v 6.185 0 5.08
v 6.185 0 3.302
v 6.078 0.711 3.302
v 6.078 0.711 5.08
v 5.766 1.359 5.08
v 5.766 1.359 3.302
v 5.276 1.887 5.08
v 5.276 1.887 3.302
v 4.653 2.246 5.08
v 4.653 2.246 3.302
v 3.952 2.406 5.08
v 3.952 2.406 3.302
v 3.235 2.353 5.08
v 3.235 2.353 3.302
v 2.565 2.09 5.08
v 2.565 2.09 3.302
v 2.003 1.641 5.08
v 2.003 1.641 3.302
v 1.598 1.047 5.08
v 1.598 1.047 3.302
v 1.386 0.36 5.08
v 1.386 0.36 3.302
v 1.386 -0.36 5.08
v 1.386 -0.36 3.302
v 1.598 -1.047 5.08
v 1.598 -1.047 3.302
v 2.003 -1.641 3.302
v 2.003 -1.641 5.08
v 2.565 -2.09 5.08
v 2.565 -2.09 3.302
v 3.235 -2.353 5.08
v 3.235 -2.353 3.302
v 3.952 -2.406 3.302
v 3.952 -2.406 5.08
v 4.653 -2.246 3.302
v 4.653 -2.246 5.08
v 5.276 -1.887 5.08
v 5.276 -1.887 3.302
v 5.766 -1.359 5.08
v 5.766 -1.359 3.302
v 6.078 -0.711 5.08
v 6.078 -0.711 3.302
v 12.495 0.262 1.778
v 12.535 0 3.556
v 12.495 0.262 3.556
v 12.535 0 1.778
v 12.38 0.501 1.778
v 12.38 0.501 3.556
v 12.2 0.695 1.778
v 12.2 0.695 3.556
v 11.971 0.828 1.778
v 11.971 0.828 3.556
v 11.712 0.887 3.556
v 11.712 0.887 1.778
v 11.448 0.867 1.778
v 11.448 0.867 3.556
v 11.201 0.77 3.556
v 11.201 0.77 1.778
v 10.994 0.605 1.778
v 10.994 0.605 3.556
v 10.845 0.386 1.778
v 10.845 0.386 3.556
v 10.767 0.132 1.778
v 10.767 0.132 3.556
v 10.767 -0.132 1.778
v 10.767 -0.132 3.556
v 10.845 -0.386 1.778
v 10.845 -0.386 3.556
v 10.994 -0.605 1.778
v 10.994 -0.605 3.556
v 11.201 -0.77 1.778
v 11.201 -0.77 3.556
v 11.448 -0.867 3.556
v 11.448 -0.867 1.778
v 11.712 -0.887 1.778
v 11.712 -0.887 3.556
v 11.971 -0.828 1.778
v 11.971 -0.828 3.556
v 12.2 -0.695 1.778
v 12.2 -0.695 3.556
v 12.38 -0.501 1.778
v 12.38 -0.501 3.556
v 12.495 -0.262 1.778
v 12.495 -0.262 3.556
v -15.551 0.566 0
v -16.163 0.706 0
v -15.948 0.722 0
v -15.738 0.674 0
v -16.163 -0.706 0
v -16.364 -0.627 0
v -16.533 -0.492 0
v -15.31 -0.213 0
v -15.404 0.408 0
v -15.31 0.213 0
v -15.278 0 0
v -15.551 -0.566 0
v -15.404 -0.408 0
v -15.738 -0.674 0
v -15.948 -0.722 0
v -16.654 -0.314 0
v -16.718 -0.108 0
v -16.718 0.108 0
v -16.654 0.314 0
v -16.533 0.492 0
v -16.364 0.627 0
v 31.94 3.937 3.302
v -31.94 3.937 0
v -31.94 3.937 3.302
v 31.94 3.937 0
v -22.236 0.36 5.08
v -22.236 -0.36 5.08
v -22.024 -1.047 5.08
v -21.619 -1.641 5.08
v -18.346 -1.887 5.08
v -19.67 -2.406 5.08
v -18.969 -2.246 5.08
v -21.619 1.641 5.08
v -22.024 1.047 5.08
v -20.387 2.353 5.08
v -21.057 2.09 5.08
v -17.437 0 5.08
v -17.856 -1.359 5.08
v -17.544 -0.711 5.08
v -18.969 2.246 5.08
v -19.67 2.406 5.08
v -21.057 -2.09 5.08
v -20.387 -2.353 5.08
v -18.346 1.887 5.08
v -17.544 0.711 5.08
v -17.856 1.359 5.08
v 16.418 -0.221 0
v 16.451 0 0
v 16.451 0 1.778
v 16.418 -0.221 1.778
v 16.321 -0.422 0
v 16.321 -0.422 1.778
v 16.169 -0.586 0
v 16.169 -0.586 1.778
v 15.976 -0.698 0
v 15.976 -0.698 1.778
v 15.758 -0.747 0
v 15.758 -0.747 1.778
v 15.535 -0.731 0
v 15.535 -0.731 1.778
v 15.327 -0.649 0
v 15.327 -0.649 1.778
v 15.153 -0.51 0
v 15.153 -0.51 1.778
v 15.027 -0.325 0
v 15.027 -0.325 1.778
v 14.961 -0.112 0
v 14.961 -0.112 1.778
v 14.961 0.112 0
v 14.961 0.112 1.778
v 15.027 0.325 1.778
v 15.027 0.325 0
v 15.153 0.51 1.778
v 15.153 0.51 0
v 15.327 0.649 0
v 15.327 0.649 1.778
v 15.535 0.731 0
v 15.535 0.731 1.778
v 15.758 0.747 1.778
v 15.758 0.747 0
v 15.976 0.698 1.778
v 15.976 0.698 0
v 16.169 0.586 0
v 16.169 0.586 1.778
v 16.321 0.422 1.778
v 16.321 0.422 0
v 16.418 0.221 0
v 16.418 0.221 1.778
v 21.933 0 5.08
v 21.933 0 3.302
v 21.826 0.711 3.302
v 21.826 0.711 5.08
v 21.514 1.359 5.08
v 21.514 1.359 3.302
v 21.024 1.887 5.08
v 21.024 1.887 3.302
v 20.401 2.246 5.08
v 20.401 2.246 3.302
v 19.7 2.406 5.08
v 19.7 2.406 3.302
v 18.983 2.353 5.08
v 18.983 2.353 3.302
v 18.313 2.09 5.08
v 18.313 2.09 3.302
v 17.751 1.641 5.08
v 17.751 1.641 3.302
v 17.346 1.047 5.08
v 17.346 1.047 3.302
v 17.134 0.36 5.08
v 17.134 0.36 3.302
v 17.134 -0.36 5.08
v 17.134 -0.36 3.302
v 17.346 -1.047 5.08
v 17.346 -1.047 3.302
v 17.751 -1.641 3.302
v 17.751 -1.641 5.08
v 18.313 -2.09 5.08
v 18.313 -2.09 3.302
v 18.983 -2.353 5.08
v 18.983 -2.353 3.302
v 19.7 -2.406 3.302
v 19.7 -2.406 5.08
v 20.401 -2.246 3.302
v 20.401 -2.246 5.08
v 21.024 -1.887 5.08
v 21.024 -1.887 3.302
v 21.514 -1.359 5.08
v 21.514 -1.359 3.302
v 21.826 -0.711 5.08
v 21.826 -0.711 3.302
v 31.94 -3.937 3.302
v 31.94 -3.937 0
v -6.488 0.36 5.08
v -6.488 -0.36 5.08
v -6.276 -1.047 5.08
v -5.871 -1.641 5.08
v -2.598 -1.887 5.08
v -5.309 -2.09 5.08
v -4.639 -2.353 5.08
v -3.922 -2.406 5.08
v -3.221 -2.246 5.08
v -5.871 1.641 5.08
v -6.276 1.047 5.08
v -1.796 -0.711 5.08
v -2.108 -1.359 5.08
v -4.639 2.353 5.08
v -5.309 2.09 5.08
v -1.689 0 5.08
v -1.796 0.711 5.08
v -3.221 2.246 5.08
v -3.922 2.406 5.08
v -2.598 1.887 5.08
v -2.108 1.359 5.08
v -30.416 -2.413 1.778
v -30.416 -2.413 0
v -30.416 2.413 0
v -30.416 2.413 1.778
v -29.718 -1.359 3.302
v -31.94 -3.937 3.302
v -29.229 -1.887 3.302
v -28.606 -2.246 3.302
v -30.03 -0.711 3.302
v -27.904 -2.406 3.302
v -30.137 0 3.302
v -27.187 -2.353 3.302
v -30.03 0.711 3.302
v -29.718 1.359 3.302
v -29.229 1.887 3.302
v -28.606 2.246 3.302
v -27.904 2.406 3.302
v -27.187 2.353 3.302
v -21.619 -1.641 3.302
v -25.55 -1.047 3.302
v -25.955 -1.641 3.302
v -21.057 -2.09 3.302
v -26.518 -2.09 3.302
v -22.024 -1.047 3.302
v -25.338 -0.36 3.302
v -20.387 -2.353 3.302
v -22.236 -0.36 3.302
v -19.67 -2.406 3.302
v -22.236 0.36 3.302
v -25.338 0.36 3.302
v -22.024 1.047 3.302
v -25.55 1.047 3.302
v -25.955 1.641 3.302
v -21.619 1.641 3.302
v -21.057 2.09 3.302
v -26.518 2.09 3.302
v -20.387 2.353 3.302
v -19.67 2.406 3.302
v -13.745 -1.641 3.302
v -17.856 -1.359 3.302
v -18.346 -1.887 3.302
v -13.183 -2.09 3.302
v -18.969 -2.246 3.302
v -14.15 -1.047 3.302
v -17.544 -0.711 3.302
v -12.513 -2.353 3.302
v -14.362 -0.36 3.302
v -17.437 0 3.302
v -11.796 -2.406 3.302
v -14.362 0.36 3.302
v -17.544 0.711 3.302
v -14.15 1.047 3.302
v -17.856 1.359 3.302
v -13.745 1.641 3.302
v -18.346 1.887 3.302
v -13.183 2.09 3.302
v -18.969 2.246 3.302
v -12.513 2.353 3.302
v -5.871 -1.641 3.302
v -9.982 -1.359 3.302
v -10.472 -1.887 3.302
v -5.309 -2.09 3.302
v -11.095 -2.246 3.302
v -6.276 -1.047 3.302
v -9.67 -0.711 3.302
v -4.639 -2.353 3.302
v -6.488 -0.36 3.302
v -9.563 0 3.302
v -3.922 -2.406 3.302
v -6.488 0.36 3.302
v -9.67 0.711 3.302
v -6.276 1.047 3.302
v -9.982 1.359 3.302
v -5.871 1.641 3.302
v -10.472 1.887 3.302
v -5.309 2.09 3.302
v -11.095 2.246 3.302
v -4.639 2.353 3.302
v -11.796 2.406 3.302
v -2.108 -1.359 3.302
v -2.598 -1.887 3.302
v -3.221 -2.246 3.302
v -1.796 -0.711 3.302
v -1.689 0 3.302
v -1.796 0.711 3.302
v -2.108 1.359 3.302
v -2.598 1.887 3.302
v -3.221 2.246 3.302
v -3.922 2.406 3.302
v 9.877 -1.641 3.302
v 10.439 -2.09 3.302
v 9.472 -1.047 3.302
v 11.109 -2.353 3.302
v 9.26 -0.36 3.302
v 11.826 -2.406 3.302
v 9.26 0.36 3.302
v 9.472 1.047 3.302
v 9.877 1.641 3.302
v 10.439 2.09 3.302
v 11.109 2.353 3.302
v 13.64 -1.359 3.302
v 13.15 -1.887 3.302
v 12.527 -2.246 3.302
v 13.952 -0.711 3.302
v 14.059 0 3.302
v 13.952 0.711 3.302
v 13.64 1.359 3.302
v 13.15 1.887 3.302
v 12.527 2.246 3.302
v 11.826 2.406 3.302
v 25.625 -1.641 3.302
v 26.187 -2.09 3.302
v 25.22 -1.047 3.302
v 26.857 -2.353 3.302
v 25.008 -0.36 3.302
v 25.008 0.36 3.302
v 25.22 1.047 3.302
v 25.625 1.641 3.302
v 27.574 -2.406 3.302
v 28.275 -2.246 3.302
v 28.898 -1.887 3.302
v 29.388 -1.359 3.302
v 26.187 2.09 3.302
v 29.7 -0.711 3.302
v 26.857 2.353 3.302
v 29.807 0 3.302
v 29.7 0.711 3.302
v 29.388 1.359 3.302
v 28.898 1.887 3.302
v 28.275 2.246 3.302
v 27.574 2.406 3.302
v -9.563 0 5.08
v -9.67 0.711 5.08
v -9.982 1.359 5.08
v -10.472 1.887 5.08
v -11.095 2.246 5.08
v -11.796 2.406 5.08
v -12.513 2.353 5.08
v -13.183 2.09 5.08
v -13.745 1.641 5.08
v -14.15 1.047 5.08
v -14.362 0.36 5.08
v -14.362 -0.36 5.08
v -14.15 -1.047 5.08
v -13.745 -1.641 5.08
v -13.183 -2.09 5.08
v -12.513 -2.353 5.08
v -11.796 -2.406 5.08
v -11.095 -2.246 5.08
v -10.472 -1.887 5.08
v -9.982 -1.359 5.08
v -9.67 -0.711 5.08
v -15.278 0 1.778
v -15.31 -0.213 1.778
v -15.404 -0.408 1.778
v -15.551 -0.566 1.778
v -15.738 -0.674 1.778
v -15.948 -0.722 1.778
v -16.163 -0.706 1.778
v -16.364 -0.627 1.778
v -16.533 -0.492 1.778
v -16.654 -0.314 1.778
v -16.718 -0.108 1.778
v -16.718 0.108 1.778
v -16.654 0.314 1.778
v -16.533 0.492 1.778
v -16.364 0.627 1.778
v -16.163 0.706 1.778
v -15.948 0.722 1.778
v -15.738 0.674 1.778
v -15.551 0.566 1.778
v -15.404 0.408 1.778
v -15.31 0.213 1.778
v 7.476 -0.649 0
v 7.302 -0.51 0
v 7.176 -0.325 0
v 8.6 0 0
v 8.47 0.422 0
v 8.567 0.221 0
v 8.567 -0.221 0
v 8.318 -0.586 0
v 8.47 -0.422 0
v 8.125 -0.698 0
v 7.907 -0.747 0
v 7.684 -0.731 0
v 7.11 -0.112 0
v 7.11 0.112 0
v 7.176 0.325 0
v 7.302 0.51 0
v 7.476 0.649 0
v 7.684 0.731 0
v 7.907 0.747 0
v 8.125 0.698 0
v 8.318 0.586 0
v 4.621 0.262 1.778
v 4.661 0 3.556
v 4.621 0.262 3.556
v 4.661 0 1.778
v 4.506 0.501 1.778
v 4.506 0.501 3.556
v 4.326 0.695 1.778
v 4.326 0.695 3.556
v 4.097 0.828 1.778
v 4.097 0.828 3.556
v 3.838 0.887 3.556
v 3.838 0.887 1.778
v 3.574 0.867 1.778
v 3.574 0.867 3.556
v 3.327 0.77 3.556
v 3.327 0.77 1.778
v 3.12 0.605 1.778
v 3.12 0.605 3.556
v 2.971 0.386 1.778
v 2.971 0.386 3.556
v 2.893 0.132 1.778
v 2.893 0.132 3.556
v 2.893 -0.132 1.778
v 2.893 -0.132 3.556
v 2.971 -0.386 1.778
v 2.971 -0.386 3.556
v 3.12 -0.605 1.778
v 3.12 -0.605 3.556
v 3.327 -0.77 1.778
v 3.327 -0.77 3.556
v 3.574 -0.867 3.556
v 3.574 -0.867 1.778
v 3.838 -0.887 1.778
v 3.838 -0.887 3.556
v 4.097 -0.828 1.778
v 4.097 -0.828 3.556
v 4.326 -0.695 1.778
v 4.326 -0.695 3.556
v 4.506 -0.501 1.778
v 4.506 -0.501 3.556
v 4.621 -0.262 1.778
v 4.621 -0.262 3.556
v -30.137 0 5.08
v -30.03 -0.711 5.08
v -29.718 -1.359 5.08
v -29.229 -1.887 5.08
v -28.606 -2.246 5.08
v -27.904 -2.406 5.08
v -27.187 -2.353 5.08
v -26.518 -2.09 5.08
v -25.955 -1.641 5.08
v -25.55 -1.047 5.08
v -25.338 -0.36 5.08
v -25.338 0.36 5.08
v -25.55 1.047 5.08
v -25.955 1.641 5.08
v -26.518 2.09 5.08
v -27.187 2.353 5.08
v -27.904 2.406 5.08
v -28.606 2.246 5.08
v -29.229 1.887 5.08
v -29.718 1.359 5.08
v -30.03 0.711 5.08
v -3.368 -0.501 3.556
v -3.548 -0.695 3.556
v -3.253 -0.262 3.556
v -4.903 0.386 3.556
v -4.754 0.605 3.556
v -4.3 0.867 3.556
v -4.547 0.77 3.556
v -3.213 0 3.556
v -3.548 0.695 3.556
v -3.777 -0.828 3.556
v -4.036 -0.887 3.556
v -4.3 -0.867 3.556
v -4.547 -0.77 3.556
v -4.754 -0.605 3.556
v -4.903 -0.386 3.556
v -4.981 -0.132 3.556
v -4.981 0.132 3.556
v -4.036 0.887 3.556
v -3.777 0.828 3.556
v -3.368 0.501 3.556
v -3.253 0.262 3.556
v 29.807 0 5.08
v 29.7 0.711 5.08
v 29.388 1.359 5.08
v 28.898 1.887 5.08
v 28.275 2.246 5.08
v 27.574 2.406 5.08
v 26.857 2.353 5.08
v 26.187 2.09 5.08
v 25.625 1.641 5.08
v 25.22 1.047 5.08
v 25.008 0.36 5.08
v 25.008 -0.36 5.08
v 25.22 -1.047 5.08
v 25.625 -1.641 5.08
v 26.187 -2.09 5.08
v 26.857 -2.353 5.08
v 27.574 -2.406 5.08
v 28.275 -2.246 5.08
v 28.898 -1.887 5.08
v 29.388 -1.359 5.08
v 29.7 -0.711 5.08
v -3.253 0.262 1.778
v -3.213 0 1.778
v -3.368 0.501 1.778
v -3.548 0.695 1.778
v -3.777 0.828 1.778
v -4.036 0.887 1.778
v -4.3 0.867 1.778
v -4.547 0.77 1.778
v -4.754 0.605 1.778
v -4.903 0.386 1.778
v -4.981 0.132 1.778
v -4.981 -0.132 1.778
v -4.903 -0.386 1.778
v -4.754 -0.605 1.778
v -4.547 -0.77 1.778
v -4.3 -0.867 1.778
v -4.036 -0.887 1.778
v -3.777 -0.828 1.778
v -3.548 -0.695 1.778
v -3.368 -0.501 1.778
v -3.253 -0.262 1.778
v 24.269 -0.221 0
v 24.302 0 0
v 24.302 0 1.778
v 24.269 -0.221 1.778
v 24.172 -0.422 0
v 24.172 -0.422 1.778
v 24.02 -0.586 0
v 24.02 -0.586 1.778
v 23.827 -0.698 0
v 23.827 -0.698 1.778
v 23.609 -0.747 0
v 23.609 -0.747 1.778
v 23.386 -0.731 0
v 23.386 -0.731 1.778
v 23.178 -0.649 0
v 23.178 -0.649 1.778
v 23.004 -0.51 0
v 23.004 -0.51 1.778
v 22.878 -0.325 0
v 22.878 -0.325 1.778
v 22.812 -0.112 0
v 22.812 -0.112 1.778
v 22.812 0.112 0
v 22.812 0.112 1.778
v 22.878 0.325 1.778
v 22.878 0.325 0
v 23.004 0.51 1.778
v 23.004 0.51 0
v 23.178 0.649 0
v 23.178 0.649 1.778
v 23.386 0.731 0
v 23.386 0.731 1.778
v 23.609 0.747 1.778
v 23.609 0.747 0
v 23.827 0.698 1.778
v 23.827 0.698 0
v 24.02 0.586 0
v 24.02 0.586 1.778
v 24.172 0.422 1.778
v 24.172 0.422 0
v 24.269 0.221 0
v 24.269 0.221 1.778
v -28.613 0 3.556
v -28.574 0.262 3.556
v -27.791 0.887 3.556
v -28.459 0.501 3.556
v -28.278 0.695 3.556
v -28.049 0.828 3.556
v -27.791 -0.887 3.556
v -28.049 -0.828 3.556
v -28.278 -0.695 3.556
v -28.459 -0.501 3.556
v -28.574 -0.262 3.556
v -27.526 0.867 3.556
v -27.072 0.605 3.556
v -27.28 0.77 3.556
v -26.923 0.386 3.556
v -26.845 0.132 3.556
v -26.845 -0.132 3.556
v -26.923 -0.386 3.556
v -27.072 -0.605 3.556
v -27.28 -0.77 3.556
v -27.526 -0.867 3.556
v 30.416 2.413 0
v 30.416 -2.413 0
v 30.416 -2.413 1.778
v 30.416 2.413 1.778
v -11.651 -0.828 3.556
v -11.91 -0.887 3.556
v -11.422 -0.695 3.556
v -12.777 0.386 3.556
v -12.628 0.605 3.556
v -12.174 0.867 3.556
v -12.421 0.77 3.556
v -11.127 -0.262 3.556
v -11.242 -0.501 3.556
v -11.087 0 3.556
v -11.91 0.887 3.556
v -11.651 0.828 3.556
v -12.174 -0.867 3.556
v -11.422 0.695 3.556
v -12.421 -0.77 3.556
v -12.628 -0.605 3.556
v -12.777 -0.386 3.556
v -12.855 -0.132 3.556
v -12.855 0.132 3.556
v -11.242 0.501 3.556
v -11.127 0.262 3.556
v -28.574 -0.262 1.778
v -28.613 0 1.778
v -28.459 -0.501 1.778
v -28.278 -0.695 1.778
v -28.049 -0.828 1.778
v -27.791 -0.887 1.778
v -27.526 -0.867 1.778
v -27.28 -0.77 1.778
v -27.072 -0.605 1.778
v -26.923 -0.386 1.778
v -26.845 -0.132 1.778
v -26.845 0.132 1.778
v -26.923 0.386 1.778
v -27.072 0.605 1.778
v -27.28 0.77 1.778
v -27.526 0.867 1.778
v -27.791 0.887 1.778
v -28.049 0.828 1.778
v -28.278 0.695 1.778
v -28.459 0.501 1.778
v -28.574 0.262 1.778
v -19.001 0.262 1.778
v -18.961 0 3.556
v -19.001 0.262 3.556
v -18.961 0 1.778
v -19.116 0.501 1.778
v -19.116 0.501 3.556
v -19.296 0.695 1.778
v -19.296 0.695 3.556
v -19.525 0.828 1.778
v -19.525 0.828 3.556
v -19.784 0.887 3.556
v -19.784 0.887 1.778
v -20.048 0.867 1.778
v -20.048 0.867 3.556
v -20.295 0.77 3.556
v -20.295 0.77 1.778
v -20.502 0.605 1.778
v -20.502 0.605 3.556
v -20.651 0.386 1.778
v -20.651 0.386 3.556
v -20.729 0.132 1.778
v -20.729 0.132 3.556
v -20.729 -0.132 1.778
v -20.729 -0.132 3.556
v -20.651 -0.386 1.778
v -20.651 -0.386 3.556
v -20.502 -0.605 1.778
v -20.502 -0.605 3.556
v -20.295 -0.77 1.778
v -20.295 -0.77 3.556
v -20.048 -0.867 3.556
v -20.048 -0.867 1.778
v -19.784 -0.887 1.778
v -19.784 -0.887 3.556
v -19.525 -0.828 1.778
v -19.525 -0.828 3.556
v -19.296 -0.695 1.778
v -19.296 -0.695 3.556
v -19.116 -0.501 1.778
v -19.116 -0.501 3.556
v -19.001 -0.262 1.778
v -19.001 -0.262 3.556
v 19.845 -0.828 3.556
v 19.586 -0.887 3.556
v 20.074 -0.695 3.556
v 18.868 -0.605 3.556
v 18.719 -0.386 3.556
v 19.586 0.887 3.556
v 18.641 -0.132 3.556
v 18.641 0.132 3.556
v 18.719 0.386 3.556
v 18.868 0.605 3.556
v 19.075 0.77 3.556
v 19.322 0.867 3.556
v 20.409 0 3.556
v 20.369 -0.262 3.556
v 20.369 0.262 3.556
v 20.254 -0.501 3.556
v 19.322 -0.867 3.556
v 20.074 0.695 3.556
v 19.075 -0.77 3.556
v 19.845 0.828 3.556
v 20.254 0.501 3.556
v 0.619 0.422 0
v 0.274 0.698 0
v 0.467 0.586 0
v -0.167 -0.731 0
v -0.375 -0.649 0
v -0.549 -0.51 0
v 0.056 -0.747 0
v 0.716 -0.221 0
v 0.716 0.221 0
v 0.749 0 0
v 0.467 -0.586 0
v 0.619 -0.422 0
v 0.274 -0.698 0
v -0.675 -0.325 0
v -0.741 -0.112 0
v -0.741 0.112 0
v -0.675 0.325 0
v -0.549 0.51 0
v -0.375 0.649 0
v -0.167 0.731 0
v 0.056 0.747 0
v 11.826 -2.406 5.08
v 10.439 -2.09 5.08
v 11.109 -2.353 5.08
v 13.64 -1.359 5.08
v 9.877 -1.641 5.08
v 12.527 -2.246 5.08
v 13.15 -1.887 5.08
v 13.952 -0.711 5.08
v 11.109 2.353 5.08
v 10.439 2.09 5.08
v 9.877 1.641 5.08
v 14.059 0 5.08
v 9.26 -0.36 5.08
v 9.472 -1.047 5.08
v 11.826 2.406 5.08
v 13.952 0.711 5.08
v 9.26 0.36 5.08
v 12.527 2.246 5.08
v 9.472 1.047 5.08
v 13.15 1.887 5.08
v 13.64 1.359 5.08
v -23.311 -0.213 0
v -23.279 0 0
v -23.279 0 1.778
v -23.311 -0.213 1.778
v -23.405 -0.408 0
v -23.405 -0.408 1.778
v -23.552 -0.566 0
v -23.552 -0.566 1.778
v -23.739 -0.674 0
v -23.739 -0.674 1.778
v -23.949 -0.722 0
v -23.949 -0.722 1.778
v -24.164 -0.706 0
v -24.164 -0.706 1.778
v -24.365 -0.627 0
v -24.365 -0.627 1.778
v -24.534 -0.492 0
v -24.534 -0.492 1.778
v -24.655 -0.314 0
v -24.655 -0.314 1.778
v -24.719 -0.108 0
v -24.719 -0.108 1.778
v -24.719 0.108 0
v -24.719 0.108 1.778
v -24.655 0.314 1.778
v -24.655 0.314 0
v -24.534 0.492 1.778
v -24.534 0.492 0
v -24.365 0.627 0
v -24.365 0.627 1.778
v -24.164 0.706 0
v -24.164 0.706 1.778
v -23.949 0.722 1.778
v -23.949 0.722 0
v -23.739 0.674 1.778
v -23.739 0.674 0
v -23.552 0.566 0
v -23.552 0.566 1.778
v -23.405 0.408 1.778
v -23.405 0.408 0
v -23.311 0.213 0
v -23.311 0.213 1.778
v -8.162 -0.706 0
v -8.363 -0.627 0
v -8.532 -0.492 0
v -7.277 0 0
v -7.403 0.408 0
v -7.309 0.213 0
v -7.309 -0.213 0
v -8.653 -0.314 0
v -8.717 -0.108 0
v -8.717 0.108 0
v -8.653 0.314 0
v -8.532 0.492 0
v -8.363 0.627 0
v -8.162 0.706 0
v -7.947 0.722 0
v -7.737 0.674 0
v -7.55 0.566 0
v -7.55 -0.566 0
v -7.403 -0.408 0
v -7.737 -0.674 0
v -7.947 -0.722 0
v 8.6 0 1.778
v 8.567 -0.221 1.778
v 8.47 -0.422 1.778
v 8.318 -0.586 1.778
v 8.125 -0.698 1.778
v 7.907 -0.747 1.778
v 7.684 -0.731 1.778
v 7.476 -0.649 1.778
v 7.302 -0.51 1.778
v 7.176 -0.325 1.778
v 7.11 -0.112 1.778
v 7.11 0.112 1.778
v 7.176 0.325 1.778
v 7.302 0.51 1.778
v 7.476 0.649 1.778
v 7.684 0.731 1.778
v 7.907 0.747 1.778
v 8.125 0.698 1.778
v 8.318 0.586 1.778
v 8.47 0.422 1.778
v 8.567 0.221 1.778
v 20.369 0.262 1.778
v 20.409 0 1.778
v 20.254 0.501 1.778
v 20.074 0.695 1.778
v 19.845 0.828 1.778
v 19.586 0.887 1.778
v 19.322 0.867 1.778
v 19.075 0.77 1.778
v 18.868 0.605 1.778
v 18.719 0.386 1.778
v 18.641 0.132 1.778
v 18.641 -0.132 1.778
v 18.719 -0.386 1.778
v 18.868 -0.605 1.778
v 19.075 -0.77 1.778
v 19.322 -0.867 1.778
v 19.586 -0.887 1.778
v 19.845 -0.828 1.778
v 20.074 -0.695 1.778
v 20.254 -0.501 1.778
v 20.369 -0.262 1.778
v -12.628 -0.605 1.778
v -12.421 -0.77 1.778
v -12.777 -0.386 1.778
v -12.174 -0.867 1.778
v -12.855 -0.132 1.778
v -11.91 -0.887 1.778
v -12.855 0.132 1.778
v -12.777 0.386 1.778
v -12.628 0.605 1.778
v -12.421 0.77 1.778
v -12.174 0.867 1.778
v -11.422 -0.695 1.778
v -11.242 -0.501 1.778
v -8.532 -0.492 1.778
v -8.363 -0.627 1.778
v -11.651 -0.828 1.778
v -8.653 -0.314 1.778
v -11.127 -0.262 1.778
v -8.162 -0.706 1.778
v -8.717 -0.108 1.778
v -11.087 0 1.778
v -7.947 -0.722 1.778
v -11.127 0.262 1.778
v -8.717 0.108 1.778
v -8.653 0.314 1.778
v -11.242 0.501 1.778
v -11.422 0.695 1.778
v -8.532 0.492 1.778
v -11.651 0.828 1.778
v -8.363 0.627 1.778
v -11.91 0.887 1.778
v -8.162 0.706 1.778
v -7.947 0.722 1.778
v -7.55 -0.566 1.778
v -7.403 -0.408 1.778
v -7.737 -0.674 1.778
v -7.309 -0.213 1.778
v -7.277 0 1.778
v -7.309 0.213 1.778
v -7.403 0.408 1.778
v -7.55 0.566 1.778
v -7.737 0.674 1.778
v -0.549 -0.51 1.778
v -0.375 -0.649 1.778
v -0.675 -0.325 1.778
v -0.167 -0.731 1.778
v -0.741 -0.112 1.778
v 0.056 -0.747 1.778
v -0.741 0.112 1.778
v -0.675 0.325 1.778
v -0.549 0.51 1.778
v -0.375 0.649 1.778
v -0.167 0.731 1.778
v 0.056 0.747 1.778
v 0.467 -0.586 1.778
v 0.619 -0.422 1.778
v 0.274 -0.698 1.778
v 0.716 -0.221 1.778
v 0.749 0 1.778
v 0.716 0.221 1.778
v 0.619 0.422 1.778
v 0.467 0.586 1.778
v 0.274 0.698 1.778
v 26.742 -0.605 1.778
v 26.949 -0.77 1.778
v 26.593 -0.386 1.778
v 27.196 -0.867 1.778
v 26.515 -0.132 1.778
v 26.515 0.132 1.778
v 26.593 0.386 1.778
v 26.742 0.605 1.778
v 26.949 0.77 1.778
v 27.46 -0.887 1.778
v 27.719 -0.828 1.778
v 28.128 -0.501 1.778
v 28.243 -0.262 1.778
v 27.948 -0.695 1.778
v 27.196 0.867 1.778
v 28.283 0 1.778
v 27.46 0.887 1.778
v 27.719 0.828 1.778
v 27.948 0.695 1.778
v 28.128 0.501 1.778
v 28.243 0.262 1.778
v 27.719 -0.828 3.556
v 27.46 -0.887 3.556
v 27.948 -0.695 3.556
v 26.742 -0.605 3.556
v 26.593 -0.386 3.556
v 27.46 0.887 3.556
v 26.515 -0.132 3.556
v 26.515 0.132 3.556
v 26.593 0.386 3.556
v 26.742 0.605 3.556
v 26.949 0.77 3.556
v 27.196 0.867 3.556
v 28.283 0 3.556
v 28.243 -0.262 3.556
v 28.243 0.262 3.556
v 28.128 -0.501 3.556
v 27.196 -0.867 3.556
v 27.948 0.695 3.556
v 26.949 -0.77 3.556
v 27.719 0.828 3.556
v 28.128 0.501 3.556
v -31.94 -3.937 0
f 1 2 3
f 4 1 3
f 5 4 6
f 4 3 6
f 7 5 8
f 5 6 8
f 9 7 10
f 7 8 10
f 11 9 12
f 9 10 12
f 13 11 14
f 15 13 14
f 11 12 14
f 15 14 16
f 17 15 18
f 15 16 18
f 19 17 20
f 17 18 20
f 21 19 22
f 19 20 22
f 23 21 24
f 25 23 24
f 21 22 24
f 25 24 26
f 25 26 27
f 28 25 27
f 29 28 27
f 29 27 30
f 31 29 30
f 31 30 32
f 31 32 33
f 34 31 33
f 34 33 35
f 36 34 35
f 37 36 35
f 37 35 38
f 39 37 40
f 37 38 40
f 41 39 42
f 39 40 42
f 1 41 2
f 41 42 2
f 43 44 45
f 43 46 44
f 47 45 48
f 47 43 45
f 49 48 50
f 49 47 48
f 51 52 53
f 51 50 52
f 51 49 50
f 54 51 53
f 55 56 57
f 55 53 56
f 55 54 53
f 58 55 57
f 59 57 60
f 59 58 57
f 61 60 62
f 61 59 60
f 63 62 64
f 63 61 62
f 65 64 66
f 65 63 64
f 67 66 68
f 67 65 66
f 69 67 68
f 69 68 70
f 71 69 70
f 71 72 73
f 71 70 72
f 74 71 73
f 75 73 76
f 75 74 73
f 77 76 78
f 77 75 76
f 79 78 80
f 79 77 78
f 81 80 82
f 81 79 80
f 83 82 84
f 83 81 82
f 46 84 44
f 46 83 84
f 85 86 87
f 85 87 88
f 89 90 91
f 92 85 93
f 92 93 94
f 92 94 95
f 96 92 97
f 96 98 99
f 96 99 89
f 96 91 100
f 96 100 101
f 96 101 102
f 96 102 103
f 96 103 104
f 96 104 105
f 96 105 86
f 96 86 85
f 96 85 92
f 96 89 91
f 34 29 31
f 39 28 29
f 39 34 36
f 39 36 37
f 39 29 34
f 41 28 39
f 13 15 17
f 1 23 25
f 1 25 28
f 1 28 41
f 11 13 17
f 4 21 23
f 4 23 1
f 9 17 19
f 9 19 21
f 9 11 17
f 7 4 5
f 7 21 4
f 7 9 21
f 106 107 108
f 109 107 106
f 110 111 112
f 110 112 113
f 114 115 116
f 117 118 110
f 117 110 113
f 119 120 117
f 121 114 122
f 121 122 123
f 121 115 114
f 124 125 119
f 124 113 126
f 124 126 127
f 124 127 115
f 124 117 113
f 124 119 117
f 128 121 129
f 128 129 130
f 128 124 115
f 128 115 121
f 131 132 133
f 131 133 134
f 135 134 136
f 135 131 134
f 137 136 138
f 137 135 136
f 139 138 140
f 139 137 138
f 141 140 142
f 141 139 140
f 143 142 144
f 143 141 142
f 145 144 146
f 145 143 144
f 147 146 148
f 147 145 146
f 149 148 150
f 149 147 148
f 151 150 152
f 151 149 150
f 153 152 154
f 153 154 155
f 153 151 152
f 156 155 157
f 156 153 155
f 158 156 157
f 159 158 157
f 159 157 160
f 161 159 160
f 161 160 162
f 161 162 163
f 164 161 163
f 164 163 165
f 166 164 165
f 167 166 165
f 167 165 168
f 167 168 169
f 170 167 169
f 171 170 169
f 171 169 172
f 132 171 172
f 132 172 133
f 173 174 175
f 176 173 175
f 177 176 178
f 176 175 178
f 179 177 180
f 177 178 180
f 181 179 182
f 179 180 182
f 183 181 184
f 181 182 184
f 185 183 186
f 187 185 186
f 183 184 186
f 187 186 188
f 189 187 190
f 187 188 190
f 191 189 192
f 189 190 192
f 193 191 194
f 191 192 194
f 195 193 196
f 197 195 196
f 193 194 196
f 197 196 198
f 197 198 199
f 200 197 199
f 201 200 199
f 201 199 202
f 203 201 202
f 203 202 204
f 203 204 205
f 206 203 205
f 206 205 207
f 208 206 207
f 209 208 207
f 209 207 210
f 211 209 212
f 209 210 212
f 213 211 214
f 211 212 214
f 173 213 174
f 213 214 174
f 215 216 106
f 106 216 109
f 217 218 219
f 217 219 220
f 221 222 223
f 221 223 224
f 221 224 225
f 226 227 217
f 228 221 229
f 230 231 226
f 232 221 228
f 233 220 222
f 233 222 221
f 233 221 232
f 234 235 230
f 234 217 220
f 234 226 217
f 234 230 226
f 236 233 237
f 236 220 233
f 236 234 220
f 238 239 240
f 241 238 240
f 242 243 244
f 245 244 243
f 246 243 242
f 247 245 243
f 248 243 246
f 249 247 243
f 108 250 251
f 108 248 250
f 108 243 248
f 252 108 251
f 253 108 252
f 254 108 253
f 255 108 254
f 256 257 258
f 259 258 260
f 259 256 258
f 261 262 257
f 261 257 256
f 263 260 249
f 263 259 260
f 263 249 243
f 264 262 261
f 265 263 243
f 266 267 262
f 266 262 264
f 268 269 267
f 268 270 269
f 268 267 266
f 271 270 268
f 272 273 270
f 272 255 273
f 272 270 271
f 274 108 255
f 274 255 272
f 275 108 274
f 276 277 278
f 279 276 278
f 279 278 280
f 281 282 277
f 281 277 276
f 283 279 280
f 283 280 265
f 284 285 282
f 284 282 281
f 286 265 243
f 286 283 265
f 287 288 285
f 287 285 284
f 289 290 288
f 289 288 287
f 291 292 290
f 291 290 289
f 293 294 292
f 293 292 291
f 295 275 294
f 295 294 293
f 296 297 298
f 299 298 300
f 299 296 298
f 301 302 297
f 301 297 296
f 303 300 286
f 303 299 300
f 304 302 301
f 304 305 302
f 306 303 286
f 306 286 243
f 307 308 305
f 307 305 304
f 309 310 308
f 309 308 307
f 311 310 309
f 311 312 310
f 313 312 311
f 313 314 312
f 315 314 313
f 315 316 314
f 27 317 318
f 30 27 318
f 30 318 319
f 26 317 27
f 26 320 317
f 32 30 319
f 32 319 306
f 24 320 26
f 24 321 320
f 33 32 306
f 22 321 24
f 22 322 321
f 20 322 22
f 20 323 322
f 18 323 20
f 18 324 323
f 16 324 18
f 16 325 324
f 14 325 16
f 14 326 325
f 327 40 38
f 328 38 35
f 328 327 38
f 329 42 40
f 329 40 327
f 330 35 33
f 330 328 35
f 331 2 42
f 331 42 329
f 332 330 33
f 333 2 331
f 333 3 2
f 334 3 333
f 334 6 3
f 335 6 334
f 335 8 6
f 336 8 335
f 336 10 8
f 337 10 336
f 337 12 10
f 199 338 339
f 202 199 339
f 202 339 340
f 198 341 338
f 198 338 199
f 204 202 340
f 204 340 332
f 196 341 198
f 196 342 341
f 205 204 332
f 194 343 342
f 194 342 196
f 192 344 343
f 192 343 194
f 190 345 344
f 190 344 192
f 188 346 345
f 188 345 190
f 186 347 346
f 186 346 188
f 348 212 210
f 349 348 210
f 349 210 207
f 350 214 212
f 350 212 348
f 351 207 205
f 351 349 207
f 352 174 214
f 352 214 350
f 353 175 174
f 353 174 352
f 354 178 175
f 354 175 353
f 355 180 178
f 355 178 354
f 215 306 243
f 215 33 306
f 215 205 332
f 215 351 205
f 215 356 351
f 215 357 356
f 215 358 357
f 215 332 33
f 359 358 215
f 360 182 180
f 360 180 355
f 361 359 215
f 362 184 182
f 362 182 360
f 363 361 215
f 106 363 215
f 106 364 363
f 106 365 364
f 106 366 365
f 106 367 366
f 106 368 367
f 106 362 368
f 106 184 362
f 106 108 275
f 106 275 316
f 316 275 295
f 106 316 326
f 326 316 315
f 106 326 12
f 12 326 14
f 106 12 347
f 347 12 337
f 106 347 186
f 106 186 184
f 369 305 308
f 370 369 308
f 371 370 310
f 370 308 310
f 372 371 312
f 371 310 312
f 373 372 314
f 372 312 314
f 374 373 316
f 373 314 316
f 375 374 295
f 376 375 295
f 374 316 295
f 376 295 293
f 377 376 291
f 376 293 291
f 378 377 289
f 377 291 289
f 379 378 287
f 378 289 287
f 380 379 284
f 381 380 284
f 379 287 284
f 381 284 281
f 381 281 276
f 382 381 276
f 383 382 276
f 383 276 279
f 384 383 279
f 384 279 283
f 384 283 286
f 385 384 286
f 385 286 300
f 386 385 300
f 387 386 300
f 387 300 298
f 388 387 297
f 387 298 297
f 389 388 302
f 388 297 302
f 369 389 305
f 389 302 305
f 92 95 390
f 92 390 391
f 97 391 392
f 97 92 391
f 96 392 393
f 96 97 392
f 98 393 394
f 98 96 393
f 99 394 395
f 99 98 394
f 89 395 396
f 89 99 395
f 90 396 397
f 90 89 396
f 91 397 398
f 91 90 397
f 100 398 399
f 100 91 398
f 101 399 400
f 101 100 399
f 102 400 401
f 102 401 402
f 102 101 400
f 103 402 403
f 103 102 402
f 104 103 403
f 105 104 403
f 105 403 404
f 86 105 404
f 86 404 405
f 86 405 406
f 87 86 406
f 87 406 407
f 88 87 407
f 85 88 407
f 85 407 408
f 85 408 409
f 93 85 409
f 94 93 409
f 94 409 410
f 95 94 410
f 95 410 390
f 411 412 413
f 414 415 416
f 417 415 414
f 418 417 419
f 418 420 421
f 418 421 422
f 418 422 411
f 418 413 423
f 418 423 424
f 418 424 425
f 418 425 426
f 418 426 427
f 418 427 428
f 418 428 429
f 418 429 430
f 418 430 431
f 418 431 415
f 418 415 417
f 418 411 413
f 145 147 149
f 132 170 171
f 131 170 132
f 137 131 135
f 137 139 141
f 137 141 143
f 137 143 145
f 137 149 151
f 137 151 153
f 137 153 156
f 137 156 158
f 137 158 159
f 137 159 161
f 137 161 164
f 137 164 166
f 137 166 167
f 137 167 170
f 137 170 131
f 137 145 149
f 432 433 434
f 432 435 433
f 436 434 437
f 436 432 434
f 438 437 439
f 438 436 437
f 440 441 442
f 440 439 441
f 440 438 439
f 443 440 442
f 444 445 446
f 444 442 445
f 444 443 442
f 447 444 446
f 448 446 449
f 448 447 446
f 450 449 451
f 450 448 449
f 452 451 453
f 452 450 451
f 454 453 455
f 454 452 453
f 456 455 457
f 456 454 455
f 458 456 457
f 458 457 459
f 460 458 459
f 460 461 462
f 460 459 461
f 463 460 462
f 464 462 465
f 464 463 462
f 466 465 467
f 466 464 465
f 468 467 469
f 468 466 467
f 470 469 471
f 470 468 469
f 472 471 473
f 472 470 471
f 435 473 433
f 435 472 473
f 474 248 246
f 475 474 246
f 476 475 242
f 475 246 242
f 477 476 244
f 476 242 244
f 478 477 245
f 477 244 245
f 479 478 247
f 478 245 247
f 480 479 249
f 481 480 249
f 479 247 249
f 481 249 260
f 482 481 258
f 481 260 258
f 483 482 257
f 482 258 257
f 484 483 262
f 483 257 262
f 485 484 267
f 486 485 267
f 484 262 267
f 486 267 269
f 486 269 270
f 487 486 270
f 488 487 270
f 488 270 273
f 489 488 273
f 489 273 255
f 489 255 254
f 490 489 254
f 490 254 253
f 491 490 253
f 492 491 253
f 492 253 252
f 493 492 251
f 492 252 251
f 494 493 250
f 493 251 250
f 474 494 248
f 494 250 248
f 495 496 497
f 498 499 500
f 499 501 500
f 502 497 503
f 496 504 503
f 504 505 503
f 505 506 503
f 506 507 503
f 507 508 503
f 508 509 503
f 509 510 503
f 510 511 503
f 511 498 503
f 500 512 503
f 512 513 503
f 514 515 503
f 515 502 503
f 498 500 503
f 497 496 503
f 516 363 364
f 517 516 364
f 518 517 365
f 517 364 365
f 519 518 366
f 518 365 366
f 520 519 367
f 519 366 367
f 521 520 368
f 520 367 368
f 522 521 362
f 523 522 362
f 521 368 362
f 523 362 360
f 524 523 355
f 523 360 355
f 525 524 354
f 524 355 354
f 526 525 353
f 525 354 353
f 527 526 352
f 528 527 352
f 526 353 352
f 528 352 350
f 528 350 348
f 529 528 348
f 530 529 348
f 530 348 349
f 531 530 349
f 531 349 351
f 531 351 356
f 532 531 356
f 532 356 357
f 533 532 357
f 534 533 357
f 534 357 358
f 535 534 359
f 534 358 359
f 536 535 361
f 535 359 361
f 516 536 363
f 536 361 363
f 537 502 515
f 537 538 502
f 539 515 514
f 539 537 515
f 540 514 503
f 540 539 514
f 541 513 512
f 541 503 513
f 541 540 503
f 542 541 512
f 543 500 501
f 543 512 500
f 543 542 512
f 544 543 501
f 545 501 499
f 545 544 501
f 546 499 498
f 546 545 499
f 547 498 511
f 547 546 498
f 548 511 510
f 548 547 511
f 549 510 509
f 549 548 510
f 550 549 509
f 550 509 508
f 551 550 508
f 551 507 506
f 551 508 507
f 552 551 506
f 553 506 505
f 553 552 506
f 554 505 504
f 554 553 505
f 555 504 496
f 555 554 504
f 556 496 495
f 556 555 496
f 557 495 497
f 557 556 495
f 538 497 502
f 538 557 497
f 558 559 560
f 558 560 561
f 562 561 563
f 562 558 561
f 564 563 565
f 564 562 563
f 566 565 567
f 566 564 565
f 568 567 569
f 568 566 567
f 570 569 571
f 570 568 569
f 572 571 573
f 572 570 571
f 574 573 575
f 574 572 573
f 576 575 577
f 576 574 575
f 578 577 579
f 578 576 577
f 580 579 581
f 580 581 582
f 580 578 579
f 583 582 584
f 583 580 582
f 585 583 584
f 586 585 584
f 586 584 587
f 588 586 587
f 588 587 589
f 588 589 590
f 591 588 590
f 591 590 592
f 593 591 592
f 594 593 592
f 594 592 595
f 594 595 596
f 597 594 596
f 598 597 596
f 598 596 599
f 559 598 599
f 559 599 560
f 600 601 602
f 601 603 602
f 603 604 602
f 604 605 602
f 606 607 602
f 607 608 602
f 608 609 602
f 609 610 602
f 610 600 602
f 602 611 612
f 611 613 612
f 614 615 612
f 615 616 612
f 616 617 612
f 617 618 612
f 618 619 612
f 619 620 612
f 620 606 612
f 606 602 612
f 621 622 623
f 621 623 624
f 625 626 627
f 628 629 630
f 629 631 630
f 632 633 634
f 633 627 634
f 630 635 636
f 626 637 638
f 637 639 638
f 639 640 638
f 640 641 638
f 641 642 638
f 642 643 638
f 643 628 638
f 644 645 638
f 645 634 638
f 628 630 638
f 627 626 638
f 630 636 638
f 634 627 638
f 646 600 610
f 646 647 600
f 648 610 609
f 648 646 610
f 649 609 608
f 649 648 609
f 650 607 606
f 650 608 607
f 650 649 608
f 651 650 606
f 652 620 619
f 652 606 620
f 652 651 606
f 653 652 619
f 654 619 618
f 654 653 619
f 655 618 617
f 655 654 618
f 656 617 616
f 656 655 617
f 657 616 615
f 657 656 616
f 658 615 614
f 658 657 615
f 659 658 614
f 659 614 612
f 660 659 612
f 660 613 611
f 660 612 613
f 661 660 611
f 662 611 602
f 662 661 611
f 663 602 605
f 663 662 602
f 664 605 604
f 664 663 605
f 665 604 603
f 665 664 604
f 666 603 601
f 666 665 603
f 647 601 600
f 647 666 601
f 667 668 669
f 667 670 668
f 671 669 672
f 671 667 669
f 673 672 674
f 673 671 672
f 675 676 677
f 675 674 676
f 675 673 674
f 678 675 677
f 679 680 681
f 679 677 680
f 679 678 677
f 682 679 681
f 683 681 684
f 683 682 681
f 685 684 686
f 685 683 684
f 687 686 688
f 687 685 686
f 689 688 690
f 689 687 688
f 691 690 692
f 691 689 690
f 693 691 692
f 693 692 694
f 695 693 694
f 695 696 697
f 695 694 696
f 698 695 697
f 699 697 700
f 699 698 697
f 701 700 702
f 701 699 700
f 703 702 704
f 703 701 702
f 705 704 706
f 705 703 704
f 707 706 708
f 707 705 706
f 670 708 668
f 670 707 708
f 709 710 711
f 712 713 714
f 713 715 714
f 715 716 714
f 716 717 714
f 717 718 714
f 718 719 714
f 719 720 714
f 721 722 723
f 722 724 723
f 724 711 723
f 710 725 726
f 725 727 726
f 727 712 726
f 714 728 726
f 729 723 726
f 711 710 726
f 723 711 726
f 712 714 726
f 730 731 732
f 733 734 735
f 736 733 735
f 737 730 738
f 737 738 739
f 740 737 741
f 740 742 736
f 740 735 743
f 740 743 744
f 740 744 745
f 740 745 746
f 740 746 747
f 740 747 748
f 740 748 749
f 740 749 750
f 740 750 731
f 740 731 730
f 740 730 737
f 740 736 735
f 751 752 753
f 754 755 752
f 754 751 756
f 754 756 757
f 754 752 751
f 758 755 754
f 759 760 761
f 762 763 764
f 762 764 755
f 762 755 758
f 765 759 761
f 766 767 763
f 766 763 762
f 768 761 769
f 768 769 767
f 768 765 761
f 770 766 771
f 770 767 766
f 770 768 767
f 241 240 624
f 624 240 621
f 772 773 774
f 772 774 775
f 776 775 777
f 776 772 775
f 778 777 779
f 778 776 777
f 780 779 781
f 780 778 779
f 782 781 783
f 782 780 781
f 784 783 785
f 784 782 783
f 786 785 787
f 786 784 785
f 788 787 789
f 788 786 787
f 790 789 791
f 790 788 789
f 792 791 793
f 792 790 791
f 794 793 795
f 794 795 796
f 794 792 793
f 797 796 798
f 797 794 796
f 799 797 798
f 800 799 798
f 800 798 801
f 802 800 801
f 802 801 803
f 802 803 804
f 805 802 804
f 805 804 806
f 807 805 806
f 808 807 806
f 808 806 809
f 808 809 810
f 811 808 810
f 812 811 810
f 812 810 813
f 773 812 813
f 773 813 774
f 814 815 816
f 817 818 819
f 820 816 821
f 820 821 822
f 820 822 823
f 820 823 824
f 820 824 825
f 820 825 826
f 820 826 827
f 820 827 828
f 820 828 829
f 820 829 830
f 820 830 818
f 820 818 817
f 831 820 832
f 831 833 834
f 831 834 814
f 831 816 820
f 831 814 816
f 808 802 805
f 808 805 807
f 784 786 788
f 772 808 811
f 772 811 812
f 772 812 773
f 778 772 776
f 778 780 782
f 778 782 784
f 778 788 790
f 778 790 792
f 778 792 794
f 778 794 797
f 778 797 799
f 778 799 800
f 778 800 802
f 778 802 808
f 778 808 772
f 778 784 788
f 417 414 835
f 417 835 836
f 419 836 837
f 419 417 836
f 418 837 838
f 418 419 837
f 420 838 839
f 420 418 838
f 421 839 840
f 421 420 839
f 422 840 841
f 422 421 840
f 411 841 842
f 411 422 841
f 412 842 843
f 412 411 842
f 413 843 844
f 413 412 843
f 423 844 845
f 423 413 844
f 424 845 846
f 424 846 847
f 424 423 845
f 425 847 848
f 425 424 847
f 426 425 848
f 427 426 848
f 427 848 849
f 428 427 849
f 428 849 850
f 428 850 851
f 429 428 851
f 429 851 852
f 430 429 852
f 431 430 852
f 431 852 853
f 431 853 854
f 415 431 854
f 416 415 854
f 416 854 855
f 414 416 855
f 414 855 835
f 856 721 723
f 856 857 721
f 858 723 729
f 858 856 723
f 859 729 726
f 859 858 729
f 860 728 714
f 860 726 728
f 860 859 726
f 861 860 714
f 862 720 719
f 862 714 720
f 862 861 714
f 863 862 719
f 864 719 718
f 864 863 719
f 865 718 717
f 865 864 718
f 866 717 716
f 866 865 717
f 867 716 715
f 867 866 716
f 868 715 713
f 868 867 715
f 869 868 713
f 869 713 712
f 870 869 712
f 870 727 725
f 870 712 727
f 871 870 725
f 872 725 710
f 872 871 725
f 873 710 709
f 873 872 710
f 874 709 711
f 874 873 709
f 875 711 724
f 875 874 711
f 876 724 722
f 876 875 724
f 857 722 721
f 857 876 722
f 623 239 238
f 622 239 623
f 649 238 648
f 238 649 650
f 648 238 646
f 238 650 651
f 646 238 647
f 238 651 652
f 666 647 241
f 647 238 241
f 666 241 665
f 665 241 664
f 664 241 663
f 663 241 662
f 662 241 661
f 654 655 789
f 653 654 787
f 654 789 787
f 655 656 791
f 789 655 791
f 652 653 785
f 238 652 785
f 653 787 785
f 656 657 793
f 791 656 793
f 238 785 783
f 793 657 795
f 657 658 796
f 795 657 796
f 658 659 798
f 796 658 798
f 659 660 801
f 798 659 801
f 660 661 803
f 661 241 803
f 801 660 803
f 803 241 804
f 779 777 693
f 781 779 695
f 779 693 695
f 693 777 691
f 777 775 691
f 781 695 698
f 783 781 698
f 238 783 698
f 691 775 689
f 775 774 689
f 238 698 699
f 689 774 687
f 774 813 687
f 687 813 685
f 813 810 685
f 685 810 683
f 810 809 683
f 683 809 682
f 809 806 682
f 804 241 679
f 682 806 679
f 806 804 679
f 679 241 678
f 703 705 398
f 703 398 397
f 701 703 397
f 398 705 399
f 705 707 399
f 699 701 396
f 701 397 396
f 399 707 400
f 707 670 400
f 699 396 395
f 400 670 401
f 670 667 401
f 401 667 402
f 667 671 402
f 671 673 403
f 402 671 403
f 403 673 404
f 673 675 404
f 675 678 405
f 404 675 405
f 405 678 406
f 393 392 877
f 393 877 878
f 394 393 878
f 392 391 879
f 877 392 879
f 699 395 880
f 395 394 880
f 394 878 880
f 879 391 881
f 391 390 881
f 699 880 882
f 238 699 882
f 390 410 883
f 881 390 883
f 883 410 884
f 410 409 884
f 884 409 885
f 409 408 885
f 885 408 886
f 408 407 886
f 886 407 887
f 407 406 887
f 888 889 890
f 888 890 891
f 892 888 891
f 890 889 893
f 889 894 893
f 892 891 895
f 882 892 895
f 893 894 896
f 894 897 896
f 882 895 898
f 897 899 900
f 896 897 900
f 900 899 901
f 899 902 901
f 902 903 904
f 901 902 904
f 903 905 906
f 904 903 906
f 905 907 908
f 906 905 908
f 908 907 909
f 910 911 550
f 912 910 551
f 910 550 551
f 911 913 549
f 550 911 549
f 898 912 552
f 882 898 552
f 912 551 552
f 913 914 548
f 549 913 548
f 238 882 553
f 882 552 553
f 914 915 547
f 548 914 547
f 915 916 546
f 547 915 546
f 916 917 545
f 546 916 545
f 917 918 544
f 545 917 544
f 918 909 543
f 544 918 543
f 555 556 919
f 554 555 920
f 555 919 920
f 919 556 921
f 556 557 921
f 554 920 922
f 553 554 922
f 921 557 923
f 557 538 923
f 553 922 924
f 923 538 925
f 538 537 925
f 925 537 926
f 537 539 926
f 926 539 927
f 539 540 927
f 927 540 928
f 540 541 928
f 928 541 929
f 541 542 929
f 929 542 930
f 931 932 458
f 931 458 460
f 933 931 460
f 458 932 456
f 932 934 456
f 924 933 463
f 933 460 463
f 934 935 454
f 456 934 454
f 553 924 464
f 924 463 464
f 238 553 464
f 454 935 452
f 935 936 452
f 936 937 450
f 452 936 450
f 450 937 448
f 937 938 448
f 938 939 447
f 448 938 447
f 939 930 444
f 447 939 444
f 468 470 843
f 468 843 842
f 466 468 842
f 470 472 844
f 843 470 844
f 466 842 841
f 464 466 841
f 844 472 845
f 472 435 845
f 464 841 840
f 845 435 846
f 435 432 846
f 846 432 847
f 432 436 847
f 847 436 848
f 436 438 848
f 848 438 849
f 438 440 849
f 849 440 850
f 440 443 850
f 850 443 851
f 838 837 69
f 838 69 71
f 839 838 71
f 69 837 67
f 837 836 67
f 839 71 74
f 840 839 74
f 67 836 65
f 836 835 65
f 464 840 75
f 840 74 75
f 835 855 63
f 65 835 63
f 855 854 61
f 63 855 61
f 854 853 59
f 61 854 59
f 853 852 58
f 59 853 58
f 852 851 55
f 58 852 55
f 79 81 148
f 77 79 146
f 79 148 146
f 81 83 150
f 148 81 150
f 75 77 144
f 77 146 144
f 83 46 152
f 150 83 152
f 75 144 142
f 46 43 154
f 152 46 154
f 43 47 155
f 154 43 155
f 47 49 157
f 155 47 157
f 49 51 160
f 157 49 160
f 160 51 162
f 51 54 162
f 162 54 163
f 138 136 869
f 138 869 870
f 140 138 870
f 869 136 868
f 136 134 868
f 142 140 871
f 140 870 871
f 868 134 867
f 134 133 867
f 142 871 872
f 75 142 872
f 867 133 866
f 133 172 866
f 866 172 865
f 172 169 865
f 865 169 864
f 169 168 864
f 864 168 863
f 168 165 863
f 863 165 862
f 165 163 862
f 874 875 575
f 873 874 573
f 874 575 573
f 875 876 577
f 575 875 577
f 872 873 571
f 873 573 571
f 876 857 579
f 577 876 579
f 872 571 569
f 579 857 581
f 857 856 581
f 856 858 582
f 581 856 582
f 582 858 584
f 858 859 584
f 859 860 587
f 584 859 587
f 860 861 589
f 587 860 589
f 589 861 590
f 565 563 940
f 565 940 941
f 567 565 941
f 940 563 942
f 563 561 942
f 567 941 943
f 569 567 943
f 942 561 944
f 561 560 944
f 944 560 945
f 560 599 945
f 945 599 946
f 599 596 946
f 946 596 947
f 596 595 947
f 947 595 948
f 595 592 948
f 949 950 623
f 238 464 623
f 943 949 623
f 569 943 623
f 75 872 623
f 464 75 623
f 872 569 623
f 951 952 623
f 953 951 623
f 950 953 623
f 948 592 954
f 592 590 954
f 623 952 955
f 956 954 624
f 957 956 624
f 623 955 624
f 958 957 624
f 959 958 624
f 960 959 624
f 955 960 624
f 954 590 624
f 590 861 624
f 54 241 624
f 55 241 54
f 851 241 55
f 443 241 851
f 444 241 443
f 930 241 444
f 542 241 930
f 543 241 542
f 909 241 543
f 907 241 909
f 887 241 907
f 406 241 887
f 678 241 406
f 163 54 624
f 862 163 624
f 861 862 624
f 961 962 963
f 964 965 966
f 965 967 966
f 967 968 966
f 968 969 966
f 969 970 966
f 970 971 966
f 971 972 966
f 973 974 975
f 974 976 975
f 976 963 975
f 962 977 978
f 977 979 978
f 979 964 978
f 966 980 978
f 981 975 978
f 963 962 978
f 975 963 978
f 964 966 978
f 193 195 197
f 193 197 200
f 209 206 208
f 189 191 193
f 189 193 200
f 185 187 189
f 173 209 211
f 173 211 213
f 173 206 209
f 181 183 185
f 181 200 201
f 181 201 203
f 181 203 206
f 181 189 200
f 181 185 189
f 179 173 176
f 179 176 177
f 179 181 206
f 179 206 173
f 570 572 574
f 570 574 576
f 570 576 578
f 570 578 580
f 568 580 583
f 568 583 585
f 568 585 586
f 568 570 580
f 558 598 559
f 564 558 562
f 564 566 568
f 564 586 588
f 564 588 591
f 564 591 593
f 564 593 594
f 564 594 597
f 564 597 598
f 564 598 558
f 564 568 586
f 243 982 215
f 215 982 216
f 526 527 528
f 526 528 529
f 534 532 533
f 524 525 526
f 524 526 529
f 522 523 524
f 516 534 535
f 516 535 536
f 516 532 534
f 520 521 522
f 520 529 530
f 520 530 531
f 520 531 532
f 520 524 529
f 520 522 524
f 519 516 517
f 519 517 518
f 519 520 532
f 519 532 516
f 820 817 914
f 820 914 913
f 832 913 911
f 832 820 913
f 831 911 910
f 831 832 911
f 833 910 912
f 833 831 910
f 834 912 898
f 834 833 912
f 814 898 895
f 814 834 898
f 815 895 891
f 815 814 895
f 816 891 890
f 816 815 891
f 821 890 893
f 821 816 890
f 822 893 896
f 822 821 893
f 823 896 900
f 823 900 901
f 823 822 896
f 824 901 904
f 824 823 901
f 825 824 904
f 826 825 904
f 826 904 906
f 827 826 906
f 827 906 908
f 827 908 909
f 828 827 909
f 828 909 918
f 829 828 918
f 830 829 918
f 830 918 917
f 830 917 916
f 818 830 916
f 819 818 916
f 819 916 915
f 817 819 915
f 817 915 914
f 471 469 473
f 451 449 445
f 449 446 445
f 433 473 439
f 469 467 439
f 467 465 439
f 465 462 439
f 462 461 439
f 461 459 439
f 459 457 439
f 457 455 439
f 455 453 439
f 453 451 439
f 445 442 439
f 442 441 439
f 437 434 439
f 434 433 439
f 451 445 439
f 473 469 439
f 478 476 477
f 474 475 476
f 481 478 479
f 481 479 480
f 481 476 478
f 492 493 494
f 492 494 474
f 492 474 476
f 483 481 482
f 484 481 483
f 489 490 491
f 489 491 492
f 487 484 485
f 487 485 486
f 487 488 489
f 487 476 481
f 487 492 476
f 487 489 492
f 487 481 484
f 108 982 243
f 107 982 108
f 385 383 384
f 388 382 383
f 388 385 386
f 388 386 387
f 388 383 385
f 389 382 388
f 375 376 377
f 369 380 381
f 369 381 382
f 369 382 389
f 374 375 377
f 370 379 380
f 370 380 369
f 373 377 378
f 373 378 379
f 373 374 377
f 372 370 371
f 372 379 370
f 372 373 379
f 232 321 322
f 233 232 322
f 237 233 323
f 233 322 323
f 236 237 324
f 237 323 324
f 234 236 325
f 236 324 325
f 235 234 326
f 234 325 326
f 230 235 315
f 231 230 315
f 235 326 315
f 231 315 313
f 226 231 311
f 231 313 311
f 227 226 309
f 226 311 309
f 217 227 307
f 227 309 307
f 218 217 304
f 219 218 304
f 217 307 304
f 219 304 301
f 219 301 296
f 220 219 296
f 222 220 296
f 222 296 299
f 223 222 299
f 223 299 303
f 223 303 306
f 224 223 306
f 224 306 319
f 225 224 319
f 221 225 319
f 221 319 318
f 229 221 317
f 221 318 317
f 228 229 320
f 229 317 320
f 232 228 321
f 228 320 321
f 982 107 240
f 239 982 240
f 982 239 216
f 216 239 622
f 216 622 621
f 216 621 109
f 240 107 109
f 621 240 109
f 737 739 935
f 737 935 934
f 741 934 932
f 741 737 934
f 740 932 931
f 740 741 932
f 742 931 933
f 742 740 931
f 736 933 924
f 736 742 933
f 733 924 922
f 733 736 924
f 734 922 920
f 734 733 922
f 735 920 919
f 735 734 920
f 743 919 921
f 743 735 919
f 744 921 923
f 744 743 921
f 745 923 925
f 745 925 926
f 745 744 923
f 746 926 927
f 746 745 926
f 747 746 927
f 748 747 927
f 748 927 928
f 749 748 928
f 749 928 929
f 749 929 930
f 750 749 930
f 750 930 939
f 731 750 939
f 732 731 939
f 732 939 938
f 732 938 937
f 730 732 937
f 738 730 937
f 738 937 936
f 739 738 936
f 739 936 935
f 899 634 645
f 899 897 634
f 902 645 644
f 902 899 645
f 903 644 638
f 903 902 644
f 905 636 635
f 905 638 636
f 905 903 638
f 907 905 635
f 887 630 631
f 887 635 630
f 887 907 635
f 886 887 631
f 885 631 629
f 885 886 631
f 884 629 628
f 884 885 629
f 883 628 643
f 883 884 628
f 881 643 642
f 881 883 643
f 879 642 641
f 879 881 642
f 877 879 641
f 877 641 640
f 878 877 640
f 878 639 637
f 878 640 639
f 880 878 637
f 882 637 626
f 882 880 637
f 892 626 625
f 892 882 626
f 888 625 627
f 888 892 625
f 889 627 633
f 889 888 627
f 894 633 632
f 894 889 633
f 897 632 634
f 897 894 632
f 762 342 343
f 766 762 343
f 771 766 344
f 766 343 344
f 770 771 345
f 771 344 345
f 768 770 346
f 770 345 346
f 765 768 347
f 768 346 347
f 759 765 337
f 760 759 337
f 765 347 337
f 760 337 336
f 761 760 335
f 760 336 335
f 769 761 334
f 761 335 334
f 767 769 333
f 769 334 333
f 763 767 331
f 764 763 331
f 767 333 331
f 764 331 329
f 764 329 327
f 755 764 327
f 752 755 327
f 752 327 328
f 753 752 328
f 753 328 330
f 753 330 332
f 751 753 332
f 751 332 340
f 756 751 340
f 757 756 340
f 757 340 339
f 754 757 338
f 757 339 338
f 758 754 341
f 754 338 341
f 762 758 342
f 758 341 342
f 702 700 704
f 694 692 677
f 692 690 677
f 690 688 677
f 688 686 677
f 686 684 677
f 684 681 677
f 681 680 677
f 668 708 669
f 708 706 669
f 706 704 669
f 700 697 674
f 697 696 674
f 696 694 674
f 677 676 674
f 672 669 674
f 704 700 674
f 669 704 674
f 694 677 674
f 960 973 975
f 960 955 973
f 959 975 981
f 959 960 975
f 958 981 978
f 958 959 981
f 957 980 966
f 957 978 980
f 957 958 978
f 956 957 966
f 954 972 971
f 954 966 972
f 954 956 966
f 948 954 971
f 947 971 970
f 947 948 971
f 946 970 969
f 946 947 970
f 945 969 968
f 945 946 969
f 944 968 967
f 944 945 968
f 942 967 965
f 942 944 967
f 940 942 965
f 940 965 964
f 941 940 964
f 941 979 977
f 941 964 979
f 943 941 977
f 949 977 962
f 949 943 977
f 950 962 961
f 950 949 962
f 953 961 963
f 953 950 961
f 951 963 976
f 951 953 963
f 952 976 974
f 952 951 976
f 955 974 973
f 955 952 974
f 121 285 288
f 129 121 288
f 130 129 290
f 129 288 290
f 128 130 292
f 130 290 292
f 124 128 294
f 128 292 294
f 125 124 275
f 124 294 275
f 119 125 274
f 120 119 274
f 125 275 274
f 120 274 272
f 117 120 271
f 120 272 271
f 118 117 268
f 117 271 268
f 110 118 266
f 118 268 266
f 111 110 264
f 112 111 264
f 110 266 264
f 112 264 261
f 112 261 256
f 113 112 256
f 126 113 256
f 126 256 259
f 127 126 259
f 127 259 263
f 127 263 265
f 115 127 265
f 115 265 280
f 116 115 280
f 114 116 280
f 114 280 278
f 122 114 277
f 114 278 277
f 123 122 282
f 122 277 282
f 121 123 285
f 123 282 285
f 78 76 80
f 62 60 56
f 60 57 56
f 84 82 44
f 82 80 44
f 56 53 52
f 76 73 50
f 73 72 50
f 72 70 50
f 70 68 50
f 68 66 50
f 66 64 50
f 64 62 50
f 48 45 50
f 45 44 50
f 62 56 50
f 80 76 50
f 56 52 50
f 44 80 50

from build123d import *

# Parameters (mm, degrees)
F0_W     = 63.881
F0_H     = 7.874
F1_DEPTH = 3.302
F2_R     = 2.413
F3_DEPTH = 1.778
F5_T     = -1.524
F7_R     = 0.7239
F6_R     = 0.7493
F8_DEPTH = 3.20278


with BuildPart() as f1:
    # F0 (on Top) → F1 (new body)
    with BuildSketch(Plane.XY):
        Rectangle(F0_W, F0_H)
    extrude(amount=F1_DEPTH)

    # F2 (on face) + F0 (on Top) → F3 (join)
    with BuildSketch(Plane.XY.offset(3.302)):
        with BuildLine():
            ThreePointArc((-25.3111, 0), (-27.7241, 2.413), (-30.1371, 0))
            ThreePointArc((-30.1371, 0), (-27.7241, -2.413), (-25.3111, 0))
        make_face()
        with Locations((-19.8501, 0)):
            Circle(F2_R)
        with Locations((-11.9761, 0)):
            Circle(F2_R)
        with Locations((-4.1021, 0)):
            Circle(F2_R)
        with Locations((3.7719, 0)):
            Circle(F2_R)
        with Locations((11.6459, 0)):
            Circle(F2_R)
        with Locations((19.5199, 0)):
            Circle(F2_R)
        with Locations((27.3939, 0)):
            Circle(F2_R)
    with BuildSketch(Plane.XY):
        Rectangle(F0_W, F0_H)
    extrude(amount=F3_DEPTH)

    # F5
    f5_openings = [f1.faces().sort_by_distance(p)[0] for p in [
        (0, 0, 0),
    ]]
    offset(amount=F5_T, openings=f5_openings, kind=Kind.INTERSECTION)

    # F7 (on face) + F6 (on face) → F8 (join)
    with BuildSketch(Plane(origin=(0, 0, 0), x_dir=(1, 0, 0), z_dir=(0, 0, -1))):
        with Locations((-8.001, 0)):
            Circle(F7_R)
        with Locations((-24.003, 0)):
            Circle(F7_R)
        with Locations((-16.002, 0)):
            Circle(F7_R)
    with BuildSketch(Plane(origin=(0, 0, 0), x_dir=(1, 0, 0), z_dir=(0, 0, -1))):
        Circle(F6_R)
        with Locations((7.85095, 0)):
            Circle(F6_R)
        with Locations((15.7019, 0)):
            Circle(F6_R)
        with Locations((23.55285, 0)):
            Circle(F6_R)
    extrude(amount=-F8_DEPTH)


solid = f1.part
